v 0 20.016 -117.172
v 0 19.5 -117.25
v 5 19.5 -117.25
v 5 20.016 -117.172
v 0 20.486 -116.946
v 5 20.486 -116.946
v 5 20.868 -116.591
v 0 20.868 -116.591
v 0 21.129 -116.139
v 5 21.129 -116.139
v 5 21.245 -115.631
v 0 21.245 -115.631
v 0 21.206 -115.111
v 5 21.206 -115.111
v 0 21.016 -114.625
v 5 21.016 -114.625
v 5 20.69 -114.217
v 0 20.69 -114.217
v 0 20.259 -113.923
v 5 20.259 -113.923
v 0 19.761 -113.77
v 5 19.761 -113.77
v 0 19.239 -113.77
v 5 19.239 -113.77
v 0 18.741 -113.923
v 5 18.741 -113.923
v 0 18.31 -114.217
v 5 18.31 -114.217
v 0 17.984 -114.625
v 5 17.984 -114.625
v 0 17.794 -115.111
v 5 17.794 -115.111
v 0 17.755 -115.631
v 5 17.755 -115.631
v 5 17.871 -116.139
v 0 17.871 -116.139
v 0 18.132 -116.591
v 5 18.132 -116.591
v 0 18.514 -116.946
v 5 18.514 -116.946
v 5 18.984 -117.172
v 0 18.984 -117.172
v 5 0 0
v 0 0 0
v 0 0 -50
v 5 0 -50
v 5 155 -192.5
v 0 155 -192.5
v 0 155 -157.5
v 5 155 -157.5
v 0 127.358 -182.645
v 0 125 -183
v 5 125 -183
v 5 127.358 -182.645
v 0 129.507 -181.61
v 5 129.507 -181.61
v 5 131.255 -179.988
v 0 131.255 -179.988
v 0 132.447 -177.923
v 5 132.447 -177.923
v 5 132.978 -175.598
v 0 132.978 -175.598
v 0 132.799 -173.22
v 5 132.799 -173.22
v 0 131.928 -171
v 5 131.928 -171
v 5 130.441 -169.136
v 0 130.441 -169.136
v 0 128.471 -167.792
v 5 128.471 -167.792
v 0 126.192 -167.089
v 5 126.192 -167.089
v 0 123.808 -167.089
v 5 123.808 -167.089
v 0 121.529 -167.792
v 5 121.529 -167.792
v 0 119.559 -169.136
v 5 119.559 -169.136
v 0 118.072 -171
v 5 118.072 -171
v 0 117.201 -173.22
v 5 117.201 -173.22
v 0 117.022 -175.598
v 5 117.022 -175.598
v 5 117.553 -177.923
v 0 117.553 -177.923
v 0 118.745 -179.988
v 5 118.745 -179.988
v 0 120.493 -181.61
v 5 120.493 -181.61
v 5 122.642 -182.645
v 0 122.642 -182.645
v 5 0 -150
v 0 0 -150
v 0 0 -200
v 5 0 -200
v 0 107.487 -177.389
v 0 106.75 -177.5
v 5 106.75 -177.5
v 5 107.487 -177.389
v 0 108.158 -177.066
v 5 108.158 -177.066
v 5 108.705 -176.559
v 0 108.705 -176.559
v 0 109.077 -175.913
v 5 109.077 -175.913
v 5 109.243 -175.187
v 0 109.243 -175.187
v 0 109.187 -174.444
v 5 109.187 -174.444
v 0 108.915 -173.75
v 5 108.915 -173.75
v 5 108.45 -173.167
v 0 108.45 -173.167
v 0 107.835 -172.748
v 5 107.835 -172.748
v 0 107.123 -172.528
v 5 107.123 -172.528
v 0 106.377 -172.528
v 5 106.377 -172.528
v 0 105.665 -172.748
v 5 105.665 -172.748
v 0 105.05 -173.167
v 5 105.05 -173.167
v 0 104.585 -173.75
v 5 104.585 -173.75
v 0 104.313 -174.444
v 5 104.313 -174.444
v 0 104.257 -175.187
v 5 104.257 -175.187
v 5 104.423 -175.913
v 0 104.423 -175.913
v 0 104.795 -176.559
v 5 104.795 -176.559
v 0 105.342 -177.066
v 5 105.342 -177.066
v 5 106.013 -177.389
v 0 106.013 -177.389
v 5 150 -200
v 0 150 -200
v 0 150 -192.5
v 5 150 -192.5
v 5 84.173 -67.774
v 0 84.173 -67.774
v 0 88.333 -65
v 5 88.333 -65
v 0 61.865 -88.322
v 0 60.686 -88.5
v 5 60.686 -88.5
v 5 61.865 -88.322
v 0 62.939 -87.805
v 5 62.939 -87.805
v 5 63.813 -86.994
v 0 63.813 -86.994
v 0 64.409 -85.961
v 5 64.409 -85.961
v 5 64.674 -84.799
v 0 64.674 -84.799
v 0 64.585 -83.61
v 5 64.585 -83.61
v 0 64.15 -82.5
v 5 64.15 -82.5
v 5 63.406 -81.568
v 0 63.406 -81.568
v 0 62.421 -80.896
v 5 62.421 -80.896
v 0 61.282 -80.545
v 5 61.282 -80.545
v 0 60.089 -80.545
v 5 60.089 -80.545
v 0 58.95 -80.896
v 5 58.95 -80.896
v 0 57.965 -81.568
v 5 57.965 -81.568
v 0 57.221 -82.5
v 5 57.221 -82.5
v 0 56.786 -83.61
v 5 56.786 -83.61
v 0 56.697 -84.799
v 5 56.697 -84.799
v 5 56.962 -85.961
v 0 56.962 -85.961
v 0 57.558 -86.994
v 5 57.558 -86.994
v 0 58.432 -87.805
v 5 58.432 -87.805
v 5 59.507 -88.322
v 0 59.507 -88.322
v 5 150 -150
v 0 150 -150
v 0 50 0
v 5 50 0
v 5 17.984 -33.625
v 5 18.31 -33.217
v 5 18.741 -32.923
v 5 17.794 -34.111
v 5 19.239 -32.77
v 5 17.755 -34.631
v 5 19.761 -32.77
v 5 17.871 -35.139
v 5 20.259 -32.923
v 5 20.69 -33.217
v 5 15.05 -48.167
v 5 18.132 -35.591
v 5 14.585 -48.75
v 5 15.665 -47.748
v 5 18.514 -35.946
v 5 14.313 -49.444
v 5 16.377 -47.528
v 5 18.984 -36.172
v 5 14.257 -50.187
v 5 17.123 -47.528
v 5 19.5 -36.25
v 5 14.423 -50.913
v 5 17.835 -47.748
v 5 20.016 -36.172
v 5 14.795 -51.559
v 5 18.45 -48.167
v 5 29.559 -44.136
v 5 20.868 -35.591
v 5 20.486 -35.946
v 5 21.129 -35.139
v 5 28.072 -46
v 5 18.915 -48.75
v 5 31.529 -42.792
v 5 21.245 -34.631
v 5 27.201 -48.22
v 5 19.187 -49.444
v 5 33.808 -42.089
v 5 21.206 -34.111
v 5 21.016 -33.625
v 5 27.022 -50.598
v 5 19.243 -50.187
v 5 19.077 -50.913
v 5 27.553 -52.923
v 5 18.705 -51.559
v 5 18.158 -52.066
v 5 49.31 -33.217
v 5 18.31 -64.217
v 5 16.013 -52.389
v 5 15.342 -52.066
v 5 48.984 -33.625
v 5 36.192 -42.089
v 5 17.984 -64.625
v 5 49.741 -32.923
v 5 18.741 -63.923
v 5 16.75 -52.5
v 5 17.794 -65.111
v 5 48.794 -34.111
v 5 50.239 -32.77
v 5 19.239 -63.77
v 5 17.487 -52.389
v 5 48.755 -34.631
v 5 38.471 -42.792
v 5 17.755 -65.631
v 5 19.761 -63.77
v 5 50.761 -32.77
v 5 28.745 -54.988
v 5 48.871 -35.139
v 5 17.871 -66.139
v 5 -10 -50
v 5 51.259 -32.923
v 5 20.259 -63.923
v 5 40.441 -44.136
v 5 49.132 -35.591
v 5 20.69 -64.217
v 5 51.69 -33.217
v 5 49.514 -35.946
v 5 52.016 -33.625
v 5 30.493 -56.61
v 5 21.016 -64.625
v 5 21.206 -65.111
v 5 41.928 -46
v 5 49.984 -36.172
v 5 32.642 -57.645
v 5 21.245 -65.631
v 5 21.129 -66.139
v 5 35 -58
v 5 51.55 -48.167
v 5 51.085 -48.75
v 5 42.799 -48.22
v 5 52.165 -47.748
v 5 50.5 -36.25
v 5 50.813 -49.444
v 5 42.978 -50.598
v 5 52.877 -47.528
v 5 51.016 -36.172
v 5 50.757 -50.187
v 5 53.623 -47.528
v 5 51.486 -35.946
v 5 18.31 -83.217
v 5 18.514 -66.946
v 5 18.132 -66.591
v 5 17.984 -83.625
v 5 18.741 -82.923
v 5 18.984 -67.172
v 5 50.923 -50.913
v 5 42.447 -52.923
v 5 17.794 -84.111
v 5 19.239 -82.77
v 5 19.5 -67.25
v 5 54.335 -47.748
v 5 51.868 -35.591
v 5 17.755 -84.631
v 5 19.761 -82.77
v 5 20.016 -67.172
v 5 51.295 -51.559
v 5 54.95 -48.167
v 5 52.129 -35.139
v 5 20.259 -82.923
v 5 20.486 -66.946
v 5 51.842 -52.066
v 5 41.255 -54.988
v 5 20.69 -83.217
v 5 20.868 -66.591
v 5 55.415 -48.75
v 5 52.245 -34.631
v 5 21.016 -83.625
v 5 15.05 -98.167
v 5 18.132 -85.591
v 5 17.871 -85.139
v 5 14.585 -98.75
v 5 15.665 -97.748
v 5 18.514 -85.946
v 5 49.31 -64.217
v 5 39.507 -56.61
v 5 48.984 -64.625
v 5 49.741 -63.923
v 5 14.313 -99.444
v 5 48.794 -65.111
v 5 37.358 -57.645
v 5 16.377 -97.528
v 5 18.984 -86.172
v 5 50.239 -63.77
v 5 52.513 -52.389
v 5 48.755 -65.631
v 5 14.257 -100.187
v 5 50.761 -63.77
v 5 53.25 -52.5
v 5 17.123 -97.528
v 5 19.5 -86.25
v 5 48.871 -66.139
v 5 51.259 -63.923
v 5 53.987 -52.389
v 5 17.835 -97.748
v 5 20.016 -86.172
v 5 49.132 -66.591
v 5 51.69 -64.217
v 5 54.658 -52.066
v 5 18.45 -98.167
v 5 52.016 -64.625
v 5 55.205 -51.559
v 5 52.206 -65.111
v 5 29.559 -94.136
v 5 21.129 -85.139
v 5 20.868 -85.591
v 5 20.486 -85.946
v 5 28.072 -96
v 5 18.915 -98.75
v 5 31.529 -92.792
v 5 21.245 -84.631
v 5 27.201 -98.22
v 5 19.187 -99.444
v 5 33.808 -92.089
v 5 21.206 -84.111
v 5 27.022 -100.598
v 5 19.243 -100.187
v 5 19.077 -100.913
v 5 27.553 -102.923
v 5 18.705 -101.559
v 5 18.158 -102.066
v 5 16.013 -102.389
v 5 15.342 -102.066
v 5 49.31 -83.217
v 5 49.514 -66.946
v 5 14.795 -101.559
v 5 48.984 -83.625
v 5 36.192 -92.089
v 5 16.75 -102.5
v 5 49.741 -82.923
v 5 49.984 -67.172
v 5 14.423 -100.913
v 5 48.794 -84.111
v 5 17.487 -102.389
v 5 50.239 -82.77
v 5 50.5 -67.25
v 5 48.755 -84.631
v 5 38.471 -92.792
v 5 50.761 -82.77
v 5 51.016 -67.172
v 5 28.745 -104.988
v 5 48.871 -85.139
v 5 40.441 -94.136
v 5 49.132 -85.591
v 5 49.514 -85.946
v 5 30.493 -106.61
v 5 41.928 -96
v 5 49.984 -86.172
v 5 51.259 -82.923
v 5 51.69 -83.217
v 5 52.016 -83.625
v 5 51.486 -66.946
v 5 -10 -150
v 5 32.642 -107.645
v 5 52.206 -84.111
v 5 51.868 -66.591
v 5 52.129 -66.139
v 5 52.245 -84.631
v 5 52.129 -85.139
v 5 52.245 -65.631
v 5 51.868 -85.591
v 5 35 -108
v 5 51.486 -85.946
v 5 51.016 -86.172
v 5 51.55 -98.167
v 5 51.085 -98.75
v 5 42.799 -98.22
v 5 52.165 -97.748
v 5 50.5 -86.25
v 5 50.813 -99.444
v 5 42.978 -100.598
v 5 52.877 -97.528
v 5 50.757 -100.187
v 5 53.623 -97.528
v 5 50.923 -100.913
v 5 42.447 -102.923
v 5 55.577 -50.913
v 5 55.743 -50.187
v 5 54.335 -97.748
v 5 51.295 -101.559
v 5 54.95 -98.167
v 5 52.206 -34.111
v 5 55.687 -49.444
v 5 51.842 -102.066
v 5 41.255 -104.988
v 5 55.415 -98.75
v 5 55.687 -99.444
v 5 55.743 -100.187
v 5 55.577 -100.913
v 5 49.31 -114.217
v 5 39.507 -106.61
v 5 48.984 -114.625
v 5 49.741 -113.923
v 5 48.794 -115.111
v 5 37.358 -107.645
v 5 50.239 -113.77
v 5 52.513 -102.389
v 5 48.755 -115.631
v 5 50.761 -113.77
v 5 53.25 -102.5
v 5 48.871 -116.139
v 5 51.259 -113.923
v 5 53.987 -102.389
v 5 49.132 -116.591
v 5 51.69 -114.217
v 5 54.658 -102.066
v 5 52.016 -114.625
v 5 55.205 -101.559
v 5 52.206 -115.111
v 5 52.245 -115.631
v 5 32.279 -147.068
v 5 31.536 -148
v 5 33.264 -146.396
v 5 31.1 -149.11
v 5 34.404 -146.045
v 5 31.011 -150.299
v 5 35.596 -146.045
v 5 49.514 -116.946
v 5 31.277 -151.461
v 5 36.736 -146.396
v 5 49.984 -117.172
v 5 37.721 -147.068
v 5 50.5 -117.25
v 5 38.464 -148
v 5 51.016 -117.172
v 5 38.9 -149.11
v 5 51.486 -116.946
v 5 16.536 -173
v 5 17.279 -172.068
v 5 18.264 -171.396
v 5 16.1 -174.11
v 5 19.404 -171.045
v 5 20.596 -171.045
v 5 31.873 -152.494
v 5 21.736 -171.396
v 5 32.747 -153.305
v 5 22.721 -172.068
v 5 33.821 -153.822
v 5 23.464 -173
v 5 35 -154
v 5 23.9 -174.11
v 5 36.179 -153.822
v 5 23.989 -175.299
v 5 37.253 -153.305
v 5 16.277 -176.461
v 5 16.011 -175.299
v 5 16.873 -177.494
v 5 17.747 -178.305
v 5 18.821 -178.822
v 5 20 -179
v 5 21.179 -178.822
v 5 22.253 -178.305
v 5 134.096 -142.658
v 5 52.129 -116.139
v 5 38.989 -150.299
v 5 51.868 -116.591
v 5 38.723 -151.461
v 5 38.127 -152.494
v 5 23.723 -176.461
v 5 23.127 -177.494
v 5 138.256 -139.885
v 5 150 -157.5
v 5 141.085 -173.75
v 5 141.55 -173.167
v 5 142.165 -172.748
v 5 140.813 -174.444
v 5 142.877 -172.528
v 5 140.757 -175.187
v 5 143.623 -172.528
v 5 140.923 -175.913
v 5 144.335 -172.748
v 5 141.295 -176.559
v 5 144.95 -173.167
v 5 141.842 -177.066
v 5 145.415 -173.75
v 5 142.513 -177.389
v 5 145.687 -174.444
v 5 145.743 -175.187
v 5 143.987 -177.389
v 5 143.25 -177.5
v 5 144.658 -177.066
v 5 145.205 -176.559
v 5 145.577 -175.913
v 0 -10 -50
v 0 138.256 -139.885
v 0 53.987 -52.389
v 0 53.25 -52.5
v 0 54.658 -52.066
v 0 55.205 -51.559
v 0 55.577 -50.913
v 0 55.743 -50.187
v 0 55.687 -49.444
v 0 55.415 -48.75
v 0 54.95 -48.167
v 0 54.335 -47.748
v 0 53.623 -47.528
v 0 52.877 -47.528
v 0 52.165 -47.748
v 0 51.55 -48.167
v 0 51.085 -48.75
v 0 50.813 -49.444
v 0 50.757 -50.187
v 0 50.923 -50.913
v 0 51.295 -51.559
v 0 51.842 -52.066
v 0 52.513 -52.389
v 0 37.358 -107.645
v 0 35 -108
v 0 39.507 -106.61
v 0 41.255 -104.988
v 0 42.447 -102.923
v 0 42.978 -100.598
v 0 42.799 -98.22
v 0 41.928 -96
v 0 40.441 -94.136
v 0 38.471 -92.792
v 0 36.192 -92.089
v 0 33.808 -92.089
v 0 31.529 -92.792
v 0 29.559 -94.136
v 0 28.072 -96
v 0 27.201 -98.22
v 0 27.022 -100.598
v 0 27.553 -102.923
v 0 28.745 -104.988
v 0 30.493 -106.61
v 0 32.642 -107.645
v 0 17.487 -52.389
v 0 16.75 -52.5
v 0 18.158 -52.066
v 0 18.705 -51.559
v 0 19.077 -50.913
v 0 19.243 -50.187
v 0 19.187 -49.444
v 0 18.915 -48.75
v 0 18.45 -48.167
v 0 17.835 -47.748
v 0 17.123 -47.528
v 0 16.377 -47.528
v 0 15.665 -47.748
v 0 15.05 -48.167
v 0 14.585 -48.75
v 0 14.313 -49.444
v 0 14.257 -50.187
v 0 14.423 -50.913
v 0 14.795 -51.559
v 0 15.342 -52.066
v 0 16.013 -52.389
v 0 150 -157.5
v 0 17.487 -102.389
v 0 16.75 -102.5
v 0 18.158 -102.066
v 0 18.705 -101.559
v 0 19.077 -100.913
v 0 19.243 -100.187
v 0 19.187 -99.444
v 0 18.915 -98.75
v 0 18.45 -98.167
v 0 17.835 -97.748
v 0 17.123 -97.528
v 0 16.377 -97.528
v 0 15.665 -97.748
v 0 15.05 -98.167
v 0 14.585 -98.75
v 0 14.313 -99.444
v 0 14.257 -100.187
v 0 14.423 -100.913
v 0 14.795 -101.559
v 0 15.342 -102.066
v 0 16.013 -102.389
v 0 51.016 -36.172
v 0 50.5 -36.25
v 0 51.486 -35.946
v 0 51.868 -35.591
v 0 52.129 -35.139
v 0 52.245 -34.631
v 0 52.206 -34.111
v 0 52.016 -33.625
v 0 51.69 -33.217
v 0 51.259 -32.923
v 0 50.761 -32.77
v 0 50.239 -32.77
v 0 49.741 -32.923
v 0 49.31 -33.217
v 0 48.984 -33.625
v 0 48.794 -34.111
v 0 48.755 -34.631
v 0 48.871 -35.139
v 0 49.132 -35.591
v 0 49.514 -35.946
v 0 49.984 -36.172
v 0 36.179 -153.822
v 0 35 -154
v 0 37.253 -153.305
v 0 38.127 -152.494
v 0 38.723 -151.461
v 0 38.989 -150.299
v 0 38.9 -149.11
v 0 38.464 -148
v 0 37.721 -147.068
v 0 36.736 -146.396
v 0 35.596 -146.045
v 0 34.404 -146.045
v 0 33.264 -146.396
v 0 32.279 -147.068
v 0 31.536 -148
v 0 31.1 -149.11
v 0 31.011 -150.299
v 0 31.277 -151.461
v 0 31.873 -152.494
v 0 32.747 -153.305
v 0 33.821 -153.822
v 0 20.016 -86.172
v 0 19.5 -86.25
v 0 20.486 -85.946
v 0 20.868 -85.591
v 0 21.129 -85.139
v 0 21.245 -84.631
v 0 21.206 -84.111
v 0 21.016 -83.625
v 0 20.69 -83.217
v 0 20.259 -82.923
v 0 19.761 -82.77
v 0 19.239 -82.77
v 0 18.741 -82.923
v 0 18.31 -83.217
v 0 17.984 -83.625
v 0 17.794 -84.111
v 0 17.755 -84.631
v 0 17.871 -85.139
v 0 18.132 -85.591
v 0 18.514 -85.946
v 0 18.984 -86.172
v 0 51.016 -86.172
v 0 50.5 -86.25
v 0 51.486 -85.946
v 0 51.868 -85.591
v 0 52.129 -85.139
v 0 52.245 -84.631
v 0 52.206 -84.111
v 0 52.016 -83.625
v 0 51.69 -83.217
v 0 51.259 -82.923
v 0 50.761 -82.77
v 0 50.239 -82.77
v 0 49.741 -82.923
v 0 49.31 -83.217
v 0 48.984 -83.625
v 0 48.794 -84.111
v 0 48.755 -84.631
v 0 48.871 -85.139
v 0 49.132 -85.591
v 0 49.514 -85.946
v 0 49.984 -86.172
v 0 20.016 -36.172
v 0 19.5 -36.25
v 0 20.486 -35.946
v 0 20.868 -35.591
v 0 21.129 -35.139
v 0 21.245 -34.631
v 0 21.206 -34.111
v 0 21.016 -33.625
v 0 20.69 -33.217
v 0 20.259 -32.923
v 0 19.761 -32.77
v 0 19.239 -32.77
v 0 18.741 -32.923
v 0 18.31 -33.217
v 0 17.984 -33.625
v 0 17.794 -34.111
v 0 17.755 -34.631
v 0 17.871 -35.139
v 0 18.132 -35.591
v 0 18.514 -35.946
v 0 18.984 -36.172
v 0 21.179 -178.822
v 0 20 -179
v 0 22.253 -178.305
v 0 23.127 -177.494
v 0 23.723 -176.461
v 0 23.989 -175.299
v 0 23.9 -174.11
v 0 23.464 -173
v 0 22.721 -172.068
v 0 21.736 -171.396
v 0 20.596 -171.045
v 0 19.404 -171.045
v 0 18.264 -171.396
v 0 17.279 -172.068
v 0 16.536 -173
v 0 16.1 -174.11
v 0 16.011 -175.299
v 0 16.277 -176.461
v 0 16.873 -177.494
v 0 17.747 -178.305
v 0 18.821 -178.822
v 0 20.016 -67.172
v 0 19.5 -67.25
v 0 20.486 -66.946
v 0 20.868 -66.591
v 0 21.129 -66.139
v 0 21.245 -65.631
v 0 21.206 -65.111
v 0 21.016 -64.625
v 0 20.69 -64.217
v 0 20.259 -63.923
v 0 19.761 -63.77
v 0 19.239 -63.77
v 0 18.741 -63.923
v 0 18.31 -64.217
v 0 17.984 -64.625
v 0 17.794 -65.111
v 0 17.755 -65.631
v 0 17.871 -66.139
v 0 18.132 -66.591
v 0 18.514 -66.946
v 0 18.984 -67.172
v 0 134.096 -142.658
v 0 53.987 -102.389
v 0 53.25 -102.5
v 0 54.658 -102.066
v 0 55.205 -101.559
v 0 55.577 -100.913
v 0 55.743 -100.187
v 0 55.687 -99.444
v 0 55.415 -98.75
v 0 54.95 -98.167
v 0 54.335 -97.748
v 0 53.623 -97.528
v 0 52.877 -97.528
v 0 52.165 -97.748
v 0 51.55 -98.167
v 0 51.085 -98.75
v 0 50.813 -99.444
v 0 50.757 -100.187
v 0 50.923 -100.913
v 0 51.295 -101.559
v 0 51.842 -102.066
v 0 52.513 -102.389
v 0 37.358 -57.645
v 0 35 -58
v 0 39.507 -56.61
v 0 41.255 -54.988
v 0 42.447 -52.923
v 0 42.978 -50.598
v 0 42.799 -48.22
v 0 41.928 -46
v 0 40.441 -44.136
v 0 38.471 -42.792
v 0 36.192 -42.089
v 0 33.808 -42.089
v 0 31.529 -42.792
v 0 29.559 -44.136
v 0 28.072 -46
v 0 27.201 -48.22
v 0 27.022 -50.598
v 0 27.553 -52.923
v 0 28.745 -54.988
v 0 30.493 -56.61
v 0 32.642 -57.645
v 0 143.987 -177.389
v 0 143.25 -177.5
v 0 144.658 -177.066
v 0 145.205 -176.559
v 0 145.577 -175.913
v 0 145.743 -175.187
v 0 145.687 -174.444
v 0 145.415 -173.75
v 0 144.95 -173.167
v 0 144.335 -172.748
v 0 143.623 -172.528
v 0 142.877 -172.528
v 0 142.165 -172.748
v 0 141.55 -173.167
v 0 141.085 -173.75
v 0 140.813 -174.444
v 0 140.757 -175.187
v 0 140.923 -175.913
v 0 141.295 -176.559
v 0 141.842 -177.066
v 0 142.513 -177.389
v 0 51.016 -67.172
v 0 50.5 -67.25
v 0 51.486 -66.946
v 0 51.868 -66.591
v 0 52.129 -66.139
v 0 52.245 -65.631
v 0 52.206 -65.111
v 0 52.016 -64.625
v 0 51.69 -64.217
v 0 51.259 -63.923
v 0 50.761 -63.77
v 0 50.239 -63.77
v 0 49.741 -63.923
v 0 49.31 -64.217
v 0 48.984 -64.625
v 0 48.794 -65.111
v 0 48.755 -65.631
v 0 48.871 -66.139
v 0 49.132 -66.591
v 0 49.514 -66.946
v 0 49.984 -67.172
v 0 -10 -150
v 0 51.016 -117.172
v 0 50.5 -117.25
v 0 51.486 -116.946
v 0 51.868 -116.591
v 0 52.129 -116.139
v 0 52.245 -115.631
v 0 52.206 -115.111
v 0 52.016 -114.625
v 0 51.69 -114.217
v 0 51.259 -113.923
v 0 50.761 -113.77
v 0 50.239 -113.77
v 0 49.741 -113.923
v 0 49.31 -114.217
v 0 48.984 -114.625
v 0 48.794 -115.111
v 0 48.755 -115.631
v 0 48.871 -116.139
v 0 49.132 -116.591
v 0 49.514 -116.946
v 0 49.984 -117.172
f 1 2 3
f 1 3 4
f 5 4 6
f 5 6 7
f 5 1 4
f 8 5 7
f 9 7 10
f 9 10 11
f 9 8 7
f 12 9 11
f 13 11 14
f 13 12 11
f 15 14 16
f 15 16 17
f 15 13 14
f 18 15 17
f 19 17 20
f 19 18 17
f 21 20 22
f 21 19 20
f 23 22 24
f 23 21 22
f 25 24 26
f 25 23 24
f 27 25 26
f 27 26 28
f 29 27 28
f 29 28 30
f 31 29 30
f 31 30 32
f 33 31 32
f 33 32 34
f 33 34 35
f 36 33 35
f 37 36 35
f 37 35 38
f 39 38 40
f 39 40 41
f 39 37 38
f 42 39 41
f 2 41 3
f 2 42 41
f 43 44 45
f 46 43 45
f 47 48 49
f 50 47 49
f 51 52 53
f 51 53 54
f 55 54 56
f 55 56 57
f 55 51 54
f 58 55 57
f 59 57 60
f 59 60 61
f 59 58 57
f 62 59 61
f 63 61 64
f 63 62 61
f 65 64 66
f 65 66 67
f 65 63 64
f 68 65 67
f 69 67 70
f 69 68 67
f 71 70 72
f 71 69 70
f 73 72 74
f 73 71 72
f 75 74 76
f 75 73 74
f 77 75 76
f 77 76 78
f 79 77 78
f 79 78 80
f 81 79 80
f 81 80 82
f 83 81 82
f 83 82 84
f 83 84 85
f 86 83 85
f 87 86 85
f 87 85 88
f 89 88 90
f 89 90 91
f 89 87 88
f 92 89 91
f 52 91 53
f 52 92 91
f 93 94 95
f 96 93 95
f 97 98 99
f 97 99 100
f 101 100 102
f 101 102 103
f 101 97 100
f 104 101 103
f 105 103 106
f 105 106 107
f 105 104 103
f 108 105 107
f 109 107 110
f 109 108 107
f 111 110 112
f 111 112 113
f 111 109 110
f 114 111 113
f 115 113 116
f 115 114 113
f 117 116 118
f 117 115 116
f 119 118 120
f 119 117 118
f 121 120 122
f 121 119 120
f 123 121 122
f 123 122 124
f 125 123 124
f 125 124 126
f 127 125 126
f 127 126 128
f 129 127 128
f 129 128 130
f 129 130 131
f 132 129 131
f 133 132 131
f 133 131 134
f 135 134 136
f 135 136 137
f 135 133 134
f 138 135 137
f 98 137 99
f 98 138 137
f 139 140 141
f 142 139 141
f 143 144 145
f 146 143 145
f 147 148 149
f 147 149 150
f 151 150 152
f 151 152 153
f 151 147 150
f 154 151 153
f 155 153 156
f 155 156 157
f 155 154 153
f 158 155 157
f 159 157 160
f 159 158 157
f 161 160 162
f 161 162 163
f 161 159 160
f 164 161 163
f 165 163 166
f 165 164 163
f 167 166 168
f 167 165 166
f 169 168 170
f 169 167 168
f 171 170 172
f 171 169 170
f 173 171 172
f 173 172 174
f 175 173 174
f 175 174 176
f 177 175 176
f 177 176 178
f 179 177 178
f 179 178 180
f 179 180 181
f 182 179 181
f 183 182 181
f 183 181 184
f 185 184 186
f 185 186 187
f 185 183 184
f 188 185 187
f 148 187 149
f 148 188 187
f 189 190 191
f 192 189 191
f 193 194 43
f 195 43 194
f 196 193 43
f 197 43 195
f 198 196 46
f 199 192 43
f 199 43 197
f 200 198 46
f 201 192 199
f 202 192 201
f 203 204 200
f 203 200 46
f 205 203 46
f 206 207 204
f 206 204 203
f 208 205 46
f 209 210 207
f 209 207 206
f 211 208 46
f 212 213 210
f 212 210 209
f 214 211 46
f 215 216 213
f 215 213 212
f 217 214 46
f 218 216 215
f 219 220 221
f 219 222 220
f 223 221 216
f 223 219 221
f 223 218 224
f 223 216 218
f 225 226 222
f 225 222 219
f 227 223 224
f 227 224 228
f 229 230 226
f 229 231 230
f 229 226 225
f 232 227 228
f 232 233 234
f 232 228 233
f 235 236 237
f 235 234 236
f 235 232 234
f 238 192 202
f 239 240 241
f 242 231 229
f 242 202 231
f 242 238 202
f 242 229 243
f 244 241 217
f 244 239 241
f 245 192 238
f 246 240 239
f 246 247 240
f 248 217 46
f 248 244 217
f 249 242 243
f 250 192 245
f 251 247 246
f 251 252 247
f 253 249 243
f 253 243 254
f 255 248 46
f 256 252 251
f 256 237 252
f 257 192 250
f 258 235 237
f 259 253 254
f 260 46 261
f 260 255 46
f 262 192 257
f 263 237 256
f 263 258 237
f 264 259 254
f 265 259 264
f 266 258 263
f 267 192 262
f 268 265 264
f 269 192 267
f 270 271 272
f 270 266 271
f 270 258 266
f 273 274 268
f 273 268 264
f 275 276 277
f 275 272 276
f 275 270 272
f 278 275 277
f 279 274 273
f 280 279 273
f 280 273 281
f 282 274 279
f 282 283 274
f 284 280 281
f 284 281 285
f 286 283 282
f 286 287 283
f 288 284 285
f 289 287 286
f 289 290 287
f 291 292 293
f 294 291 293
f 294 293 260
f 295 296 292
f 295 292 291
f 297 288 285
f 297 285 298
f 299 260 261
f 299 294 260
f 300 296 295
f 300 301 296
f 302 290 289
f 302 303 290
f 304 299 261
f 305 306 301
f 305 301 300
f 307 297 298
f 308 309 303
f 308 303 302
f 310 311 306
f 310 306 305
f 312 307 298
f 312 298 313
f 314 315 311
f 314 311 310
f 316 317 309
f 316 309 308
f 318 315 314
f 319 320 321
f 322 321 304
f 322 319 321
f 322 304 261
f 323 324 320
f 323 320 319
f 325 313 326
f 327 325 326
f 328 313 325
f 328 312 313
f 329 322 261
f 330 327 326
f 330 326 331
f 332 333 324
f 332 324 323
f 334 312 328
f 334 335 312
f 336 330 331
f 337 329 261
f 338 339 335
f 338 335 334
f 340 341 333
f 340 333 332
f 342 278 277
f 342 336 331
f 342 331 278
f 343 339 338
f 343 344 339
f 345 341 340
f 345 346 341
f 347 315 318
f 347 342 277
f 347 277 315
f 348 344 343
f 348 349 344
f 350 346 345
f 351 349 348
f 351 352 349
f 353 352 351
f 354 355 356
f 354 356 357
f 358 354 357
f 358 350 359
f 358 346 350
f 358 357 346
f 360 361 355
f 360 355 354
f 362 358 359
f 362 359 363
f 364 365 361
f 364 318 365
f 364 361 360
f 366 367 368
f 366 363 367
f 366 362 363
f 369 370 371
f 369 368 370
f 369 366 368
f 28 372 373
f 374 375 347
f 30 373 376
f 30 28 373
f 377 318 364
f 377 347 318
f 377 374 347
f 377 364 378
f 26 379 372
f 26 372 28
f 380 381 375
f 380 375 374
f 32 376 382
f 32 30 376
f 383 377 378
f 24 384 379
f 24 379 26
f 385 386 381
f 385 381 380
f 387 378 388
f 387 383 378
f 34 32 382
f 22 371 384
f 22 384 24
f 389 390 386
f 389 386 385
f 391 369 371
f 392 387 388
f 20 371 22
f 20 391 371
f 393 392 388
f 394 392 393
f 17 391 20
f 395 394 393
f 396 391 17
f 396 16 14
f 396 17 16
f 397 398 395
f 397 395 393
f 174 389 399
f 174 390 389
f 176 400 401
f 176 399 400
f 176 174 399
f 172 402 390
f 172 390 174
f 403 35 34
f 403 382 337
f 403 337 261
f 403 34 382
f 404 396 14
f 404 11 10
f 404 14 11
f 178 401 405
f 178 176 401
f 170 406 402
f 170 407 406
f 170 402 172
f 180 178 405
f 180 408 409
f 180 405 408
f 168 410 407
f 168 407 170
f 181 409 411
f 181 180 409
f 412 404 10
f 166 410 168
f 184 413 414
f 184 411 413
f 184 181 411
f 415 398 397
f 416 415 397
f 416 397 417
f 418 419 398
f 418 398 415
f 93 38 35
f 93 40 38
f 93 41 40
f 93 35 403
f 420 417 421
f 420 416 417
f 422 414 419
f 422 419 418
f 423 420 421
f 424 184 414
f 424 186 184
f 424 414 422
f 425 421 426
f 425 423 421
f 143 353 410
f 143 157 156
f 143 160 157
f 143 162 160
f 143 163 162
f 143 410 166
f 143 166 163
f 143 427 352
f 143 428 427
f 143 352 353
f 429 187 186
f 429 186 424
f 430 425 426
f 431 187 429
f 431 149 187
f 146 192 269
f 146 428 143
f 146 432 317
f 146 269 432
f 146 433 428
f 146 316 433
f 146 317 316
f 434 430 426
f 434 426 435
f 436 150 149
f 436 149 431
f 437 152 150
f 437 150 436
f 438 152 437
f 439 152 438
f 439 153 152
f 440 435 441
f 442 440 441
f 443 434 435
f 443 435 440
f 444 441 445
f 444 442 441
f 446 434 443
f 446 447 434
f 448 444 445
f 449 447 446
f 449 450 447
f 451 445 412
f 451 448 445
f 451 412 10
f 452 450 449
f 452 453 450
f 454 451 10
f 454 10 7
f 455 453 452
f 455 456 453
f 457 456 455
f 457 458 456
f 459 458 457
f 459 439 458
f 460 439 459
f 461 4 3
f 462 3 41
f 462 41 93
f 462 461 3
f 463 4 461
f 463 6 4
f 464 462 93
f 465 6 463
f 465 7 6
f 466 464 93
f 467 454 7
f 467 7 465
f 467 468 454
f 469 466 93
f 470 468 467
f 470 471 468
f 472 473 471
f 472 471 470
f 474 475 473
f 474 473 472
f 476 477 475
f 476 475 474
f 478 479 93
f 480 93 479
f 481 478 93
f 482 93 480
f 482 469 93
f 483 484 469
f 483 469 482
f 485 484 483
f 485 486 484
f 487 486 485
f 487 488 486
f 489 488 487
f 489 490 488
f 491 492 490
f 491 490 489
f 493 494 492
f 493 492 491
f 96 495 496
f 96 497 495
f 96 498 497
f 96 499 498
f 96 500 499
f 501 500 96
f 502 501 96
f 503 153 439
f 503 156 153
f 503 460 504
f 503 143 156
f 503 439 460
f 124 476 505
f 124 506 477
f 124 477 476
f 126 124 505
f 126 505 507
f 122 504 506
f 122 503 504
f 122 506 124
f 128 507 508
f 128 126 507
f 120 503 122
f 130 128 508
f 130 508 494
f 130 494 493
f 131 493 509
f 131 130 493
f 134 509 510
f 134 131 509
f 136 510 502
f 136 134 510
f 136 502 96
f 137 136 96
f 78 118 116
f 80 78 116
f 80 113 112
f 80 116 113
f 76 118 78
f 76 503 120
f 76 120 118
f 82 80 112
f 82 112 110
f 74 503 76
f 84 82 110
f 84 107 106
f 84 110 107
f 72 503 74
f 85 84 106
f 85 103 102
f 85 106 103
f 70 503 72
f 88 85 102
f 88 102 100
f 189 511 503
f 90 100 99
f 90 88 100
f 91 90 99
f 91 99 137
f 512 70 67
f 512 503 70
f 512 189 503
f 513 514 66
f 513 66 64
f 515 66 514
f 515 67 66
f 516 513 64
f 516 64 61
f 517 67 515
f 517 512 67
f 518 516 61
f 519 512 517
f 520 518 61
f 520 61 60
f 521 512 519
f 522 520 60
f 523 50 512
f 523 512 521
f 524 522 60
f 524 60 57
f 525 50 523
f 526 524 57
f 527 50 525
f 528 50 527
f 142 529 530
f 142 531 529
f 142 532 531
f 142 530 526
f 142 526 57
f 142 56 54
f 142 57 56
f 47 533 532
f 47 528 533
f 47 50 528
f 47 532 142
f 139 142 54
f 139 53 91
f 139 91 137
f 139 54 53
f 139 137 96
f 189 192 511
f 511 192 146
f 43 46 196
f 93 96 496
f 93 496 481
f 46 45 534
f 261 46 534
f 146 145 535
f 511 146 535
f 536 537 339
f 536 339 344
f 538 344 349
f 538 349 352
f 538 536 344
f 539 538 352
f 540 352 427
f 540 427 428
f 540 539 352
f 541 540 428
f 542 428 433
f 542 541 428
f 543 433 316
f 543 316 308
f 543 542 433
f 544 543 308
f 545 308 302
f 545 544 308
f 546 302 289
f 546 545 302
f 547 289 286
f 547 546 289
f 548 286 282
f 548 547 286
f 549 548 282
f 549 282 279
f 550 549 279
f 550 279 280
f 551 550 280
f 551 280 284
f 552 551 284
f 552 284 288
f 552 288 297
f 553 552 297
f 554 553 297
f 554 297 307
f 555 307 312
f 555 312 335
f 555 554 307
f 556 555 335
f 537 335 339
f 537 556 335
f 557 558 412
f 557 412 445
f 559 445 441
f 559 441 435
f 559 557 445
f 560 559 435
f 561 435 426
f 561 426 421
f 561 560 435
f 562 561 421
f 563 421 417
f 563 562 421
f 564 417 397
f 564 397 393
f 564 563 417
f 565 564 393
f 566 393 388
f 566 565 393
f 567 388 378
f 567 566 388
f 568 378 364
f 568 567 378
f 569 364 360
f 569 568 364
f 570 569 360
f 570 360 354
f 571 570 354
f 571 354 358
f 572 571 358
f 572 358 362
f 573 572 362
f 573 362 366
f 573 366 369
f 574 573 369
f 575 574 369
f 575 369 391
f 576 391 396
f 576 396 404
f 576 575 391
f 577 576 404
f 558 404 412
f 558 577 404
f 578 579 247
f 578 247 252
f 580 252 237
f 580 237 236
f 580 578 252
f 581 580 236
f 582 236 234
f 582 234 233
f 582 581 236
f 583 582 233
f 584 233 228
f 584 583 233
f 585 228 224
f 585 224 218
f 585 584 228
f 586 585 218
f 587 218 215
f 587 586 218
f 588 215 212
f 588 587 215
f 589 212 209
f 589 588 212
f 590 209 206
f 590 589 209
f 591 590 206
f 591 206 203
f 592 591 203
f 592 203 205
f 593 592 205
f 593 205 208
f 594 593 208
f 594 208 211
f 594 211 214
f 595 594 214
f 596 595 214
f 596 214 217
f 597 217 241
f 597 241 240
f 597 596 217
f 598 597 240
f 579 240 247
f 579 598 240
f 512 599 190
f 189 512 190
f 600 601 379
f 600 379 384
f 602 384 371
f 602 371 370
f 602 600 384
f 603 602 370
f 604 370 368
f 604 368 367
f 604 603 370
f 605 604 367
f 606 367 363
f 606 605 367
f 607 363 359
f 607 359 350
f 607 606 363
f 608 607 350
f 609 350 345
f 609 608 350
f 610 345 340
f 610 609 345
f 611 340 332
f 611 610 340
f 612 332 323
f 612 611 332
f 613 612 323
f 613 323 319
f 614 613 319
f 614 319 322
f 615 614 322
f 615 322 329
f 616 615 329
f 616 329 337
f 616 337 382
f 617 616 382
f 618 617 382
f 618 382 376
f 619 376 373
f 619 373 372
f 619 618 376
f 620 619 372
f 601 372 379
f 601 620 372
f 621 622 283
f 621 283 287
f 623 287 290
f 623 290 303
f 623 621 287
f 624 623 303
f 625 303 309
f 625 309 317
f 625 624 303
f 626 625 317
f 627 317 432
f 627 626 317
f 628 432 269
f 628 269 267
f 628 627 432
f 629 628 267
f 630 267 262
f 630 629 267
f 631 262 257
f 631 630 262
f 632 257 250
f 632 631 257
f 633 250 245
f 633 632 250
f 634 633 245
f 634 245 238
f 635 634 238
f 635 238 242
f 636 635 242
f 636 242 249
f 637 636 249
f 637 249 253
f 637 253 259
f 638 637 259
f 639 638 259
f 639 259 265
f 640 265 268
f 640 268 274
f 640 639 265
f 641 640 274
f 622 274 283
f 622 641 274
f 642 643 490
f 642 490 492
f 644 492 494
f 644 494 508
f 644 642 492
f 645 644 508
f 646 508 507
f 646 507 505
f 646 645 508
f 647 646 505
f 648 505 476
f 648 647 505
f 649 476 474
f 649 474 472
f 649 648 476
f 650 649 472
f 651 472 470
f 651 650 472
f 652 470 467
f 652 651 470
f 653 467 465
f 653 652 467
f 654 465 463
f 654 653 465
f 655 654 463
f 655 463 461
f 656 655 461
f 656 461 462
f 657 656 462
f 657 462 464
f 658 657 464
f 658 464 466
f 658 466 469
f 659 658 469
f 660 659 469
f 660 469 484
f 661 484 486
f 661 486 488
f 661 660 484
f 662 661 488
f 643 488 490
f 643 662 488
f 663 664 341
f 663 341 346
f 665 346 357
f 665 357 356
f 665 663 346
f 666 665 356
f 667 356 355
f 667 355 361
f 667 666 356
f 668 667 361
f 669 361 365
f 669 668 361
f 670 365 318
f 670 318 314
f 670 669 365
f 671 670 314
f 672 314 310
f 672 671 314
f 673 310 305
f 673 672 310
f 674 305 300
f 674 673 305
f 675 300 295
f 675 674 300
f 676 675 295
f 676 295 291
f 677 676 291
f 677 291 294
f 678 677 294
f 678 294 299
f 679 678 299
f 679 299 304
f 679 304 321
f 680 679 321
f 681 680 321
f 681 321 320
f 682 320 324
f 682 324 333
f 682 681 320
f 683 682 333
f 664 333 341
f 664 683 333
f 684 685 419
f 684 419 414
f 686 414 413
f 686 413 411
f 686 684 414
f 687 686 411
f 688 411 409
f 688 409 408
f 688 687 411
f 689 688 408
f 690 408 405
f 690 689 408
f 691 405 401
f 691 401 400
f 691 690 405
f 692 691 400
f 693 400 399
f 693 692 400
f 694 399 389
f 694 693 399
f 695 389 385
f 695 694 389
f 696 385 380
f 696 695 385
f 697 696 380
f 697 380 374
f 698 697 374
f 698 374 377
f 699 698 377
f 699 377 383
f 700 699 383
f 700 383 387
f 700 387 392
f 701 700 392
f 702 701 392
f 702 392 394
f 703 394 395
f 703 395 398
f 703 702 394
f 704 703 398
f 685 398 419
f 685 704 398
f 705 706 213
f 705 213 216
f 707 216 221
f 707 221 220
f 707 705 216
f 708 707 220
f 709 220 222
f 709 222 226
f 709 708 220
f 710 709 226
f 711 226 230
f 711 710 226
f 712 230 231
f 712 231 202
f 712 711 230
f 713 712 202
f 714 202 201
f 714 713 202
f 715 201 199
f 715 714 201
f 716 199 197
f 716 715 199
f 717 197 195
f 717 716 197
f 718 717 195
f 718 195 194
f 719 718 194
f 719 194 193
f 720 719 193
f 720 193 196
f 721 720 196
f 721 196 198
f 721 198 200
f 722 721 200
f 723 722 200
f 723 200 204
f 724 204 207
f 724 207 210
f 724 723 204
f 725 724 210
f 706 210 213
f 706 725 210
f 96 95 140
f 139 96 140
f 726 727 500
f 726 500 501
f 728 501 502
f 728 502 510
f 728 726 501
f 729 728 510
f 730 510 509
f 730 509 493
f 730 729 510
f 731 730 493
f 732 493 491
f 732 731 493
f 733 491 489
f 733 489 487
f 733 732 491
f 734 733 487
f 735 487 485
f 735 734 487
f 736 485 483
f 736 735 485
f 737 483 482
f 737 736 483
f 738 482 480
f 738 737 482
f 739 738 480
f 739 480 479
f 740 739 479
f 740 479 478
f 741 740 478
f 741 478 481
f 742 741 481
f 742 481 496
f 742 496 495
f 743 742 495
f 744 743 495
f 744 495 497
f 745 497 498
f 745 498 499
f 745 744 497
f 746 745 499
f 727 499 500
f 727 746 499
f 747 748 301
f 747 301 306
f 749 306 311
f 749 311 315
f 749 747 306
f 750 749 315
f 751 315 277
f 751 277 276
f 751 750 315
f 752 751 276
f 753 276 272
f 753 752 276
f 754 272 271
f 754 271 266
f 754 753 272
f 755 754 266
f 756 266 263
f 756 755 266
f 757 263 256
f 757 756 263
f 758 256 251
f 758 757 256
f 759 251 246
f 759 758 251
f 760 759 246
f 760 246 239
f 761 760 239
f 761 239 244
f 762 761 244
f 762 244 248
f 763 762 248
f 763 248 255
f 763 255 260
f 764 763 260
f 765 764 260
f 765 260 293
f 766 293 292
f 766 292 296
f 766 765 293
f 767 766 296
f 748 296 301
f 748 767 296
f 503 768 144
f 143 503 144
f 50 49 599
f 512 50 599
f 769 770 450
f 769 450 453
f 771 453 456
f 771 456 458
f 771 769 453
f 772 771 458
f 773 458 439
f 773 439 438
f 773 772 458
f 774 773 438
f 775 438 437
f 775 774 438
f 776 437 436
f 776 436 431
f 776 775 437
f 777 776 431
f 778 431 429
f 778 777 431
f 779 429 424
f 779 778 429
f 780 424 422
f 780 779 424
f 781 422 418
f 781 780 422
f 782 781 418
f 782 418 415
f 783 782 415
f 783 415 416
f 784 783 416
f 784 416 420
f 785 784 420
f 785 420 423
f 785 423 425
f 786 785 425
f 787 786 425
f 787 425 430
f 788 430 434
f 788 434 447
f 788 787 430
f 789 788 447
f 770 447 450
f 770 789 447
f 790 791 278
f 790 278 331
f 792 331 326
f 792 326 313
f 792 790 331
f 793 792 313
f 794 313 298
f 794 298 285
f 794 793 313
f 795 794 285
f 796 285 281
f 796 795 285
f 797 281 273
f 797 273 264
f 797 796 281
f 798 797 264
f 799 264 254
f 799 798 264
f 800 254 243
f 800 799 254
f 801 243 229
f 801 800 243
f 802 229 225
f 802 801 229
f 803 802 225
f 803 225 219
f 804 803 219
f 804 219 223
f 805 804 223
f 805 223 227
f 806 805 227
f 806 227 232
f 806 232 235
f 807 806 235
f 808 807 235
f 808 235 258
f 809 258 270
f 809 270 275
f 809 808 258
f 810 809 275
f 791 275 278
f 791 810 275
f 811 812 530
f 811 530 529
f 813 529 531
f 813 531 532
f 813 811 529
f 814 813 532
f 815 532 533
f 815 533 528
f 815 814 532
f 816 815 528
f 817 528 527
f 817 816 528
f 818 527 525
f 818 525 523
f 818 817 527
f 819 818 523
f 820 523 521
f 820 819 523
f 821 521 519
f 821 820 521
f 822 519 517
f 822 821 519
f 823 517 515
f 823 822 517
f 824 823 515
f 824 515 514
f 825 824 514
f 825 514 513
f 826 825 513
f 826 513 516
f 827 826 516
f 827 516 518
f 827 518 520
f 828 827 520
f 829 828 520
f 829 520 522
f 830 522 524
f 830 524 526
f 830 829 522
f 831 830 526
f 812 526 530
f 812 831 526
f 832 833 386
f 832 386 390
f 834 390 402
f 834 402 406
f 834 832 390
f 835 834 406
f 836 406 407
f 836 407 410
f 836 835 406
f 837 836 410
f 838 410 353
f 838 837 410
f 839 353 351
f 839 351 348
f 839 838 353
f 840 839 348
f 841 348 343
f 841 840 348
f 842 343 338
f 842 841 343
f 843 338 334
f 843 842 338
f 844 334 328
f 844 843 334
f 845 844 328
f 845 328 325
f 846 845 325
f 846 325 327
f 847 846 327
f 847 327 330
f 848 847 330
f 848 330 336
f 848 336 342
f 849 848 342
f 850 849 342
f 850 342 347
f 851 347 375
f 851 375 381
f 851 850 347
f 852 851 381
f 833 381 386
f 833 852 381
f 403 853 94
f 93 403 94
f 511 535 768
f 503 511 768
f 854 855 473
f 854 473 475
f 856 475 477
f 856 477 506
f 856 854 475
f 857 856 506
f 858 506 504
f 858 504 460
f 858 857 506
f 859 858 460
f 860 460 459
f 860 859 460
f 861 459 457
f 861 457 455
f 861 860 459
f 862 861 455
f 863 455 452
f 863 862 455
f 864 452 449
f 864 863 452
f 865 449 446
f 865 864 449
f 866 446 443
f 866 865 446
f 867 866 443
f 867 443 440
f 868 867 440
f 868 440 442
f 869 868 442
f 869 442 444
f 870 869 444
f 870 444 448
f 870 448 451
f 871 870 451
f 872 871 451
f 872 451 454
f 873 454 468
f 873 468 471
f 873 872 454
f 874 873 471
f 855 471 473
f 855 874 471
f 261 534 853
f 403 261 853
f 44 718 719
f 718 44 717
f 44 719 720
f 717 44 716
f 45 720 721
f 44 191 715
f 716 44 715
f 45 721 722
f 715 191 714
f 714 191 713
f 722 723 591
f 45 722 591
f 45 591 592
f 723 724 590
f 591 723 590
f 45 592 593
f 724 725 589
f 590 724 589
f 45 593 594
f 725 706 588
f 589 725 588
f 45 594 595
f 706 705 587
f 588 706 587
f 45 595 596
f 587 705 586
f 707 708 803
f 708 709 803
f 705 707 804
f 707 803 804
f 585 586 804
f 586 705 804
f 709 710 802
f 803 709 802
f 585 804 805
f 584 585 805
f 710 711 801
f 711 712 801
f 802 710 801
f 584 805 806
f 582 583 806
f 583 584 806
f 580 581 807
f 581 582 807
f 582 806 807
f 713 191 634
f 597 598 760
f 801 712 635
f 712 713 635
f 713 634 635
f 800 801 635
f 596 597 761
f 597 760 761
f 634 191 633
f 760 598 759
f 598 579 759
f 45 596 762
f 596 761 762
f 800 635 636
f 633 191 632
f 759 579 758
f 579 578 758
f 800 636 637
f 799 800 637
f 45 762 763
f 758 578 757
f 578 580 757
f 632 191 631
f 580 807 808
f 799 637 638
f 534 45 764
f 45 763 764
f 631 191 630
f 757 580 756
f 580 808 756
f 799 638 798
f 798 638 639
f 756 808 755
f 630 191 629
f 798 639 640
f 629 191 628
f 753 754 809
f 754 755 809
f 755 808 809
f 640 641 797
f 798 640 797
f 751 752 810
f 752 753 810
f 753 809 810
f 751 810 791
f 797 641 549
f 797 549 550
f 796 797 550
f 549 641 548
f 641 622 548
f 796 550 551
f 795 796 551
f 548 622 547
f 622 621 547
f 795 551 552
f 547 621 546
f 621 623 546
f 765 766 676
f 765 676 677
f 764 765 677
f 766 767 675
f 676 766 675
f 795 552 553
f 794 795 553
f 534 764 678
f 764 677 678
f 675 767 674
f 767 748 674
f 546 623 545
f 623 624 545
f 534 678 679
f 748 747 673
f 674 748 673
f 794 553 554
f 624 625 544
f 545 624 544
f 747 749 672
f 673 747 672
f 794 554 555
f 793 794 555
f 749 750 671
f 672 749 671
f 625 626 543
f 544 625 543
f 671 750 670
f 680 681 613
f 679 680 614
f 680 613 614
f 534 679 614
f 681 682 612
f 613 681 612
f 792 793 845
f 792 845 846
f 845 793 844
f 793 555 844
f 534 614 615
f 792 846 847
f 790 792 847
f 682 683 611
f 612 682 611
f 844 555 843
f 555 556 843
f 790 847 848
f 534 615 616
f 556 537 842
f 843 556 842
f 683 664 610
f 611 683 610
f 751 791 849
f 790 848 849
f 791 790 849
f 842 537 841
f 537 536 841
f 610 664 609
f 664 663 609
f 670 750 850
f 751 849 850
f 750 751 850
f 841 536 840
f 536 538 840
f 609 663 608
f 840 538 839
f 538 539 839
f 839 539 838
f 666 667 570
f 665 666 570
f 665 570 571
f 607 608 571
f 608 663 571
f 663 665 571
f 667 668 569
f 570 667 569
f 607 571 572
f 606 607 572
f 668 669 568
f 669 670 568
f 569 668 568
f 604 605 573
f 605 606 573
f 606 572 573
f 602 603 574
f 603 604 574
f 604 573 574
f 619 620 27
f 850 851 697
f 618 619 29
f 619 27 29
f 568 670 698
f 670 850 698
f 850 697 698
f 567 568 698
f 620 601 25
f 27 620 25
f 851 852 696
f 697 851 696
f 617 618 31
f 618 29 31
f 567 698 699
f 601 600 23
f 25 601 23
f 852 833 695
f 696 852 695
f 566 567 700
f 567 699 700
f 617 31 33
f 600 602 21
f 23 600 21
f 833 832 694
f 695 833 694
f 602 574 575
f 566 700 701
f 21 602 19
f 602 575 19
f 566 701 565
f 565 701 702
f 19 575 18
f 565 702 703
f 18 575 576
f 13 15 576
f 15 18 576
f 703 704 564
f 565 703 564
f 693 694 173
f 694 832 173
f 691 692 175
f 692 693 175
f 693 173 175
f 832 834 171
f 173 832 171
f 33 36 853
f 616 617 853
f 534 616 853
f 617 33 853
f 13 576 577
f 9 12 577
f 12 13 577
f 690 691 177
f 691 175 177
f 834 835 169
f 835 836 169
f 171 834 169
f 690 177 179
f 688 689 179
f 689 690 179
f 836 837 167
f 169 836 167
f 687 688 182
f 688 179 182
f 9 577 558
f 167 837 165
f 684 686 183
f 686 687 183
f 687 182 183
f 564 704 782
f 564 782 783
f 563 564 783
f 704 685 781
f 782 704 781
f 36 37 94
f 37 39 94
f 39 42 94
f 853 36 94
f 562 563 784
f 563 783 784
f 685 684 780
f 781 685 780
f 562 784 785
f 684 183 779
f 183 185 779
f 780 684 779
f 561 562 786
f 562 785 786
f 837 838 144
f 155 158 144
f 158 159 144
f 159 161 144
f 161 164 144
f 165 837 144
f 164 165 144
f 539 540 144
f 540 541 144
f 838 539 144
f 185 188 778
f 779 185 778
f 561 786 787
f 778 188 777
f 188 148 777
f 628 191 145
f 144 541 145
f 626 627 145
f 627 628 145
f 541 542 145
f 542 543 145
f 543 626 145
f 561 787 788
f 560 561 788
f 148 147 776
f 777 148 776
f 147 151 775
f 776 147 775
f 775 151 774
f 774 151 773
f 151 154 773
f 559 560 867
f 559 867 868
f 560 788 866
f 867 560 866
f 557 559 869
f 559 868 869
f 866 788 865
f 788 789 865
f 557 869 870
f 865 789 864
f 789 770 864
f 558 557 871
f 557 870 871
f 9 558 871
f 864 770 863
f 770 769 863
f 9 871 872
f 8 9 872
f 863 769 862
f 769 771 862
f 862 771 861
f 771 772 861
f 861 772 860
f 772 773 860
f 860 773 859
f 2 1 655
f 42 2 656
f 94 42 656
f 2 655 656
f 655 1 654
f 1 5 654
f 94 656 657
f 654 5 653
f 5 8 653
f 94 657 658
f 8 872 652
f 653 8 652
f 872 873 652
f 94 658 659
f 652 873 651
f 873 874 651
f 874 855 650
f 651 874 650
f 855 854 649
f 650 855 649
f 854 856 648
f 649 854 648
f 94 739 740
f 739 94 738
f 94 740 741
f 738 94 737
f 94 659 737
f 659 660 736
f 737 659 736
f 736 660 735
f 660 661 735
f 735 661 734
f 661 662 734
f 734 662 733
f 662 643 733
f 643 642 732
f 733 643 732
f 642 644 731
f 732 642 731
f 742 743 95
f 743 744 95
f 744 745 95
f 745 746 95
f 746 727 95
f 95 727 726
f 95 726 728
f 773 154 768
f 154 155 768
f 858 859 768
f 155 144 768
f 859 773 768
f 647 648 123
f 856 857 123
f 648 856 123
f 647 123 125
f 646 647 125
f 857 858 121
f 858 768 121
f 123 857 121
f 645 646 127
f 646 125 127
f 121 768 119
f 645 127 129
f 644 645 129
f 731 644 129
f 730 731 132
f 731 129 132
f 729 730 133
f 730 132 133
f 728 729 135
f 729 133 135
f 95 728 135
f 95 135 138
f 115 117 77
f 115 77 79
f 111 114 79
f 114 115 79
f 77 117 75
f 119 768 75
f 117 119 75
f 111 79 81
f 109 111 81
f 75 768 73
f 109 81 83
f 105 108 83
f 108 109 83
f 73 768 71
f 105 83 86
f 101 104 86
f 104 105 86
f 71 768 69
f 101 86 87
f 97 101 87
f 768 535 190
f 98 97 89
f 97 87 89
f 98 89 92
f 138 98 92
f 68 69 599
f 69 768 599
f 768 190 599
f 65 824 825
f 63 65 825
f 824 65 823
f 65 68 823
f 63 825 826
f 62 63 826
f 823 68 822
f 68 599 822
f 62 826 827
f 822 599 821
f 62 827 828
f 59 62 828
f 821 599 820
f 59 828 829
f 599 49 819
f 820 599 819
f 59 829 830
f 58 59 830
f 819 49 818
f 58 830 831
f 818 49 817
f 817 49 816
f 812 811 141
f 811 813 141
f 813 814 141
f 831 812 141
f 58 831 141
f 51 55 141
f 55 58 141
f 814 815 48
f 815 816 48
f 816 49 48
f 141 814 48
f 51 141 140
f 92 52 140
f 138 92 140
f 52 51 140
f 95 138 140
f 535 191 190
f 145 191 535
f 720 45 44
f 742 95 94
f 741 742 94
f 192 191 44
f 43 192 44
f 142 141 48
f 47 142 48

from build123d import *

# Parameters (mm, degrees)
CROQUIS1_R              = 8
CROQUIS1_R_2            = 4
CROQUIS1_R_3            = 2.5
CROQUIS1_R_4            = 1.75
SALIENTE_EXTRUIR1_DEPTH = 5


with BuildPart() as part:
    # Croquis1 → Saliente-Extruir1 (new body)
    with BuildSketch(Plane(origin=(0, 0, 0), x_dir=(0, 0, -1), z_dir=(1, 0, 0))):
        Polygon((150, 150), (0, 50), (0, 0), (50, 0), (50, -10), (150, -10), (150, 0), (200, 0), (200, 150), (192.5, 150), (192.5, 155), (157.5, 155), (157.5, 150), align=None)
        with Locations((175, 125)):
            Circle(CROQUIS1_R, mode=Mode.SUBTRACT)
        with Locations((175, 20)):
            Circle(CROQUIS1_R_2, mode=Mode.SUBTRACT)
        with Locations((150, 35)):
            Circle(CROQUIS1_R_2, mode=Mode.SUBTRACT)
        with Locations((175, 143.25)):
            Circle(CROQUIS1_R_3, mode=Mode.SUBTRACT)
        with Locations((175, 106.75)):
            Circle(CROQUIS1_R_3, mode=Mode.SUBTRACT)
        with Locations((100, 35)):
            Circle(CROQUIS1_R, mode=Mode.SUBTRACT)
        with Locations((84.5, 60.685599078)):
            Circle(CROQUIS1_R_2, mode=Mode.SUBTRACT)
        with Locations((100, 53.25)):
            Circle(CROQUIS1_R_3, mode=Mode.SUBTRACT)
        with Locations((100, 16.75)):
            Circle(CROQUIS1_R_3, mode=Mode.SUBTRACT)
        with Locations((84.5, 50.5)):
            Circle(CROQUIS1_R_4, mode=Mode.SUBTRACT)
        with Locations((115.5, 50.5)):
            Circle(CROQUIS1_R_4, mode=Mode.SUBTRACT)
        with Locations((115.5, 19.5)):
            Circle(CROQUIS1_R_4, mode=Mode.SUBTRACT)
        with Locations((84.5, 19.5)):
            Circle(CROQUIS1_R_4, mode=Mode.SUBTRACT)
        with Locations((50, 35)):
            Circle(CROQUIS1_R, mode=Mode.SUBTRACT)
        with Locations((50, 53.25)):
            Circle(CROQUIS1_R_3, mode=Mode.SUBTRACT)
        with Locations((50, 16.75)):
            Circle(CROQUIS1_R_3, mode=Mode.SUBTRACT)
        with Locations((34.5, 50.5)):
            Circle(CROQUIS1_R_4, mode=Mode.SUBTRACT)
        with Locations((65.5, 50.5)):
            Circle(CROQUIS1_R_4, mode=Mode.SUBTRACT)
        with Locations((65.5, 19.5)):
            Circle(CROQUIS1_R_4, mode=Mode.SUBTRACT)
        with Locations((34.5, 19.5)):
            Circle(CROQUIS1_R_4, mode=Mode.SUBTRACT)
        Polygon((65, 88.333333333), (139.88452649, 138.256350994), (142.658027472, 134.096099522), (67.773500981, 84.173081862), align=None, mode=Mode.SUBTRACT)
    extrude(amount=SALIENTE_EXTRUIR1_DEPTH)


solid = part.part
